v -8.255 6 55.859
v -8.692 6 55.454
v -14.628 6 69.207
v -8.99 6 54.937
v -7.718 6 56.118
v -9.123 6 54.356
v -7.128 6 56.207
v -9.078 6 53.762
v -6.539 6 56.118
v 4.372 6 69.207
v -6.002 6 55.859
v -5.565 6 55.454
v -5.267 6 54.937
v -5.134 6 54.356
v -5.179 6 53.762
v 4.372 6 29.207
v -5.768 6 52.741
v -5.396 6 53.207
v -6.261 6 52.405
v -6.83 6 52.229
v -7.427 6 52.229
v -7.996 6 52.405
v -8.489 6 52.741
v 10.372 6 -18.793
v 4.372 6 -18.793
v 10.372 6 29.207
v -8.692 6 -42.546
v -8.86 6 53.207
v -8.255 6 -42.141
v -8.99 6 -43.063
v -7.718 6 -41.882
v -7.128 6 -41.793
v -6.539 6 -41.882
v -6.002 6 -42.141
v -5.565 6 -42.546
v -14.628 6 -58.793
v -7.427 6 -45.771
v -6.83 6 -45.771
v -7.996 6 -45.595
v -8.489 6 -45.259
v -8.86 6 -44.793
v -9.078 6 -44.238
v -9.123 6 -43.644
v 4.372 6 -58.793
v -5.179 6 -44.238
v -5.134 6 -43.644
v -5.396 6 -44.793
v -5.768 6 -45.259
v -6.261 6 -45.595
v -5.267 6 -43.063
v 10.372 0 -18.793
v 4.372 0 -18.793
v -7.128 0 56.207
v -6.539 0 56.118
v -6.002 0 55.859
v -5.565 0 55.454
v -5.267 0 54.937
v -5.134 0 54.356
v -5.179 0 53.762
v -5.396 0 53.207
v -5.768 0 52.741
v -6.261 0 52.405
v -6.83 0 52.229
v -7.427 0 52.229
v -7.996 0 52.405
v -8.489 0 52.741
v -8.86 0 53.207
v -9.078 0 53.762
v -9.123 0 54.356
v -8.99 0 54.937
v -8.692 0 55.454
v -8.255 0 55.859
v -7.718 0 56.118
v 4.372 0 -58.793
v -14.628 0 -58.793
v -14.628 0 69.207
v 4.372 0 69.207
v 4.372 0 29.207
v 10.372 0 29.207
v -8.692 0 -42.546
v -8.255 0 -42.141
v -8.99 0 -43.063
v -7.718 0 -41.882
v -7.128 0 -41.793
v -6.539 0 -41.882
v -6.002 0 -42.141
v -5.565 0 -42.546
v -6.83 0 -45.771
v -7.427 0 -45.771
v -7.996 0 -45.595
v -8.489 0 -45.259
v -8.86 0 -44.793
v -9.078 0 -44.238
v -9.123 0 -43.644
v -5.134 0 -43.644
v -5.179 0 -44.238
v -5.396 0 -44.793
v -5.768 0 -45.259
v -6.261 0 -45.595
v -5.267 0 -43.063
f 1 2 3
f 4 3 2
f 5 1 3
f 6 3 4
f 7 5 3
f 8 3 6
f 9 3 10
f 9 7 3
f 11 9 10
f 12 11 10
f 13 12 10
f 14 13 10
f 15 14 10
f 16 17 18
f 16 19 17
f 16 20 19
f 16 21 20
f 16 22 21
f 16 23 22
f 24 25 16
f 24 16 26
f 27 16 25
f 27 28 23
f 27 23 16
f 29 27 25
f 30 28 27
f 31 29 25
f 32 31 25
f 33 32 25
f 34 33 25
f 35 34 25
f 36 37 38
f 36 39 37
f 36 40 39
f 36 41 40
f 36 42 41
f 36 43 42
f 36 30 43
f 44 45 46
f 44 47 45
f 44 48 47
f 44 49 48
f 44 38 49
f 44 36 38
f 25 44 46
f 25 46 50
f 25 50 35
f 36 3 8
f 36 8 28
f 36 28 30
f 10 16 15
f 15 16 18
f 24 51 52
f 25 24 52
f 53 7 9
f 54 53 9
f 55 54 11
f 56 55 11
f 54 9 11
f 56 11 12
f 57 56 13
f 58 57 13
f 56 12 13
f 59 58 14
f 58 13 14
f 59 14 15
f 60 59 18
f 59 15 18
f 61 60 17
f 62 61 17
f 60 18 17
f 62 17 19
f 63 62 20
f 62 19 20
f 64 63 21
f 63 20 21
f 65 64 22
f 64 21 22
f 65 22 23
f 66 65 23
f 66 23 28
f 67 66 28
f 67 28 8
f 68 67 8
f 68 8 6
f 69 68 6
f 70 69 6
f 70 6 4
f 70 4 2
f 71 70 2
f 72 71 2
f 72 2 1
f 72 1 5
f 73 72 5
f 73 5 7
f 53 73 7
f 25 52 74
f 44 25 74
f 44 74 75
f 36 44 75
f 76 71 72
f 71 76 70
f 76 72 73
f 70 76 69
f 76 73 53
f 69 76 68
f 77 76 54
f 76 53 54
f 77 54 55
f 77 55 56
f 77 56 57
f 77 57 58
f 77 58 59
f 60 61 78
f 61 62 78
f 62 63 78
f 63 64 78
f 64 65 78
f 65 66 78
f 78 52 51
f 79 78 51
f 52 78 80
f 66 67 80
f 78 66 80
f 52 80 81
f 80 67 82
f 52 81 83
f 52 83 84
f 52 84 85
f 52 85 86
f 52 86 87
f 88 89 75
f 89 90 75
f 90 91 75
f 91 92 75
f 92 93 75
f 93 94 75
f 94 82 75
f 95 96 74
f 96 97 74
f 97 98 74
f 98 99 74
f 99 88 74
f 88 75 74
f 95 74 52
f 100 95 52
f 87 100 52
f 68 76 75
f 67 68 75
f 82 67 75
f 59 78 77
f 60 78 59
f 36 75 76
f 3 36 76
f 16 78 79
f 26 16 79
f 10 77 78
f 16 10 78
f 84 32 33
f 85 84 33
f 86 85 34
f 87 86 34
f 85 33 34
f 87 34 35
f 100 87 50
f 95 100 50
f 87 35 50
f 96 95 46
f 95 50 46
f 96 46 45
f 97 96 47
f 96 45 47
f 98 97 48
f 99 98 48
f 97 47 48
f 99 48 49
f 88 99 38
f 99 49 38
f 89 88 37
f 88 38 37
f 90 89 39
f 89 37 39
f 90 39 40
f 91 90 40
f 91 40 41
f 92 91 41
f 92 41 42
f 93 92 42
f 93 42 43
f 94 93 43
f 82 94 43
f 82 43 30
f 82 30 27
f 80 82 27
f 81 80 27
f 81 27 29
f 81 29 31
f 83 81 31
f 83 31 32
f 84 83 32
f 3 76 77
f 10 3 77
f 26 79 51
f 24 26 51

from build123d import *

# Parameters (mm, degrees)
BOSS_EXTRUDE1_DEPTH = 6
SKETCH2_R           = 2
CUT_EXTRUDE1_DEPTH  = 71.989922019


with BuildPart() as part:
    # Sketch1 → Boss-Extrude1 (new body)
    with BuildSketch(Plane(origin=(0, 0, 0), x_dir=(1, 0, 0), z_dir=(0, 1, 0))):
        Polygon((4.371579812, 18.793220339), (4.371579812, 58.793220339), (-14.628420188, 58.793220339), (-14.628420188, -69.206779661), (4.371579812, -69.206779661), (4.371579812, -29.206779661), (10.371579812, -29.206779661), (10.371579812, 18.793220339), align=None)
    extrude(amount=BOSS_EXTRUDE1_DEPTH)

    # Sketch2 → Cut-Extrude1 (cut, through all)
    with BuildSketch(Plane(origin=(0, 6, 0), x_dir=(1, 0, 0), z_dir=(0, 1, 0))):
        with Locations((-7.128420188, -54.206779661)):
            Circle(SKETCH2_R)
        with Locations((-7.128420188, 43.793220339)):
            Circle(SKETCH2_R)
    extrude(amount=-CUT_EXTRUDE1_DEPTH, mode=Mode.SUBTRACT)


solid = part.part
